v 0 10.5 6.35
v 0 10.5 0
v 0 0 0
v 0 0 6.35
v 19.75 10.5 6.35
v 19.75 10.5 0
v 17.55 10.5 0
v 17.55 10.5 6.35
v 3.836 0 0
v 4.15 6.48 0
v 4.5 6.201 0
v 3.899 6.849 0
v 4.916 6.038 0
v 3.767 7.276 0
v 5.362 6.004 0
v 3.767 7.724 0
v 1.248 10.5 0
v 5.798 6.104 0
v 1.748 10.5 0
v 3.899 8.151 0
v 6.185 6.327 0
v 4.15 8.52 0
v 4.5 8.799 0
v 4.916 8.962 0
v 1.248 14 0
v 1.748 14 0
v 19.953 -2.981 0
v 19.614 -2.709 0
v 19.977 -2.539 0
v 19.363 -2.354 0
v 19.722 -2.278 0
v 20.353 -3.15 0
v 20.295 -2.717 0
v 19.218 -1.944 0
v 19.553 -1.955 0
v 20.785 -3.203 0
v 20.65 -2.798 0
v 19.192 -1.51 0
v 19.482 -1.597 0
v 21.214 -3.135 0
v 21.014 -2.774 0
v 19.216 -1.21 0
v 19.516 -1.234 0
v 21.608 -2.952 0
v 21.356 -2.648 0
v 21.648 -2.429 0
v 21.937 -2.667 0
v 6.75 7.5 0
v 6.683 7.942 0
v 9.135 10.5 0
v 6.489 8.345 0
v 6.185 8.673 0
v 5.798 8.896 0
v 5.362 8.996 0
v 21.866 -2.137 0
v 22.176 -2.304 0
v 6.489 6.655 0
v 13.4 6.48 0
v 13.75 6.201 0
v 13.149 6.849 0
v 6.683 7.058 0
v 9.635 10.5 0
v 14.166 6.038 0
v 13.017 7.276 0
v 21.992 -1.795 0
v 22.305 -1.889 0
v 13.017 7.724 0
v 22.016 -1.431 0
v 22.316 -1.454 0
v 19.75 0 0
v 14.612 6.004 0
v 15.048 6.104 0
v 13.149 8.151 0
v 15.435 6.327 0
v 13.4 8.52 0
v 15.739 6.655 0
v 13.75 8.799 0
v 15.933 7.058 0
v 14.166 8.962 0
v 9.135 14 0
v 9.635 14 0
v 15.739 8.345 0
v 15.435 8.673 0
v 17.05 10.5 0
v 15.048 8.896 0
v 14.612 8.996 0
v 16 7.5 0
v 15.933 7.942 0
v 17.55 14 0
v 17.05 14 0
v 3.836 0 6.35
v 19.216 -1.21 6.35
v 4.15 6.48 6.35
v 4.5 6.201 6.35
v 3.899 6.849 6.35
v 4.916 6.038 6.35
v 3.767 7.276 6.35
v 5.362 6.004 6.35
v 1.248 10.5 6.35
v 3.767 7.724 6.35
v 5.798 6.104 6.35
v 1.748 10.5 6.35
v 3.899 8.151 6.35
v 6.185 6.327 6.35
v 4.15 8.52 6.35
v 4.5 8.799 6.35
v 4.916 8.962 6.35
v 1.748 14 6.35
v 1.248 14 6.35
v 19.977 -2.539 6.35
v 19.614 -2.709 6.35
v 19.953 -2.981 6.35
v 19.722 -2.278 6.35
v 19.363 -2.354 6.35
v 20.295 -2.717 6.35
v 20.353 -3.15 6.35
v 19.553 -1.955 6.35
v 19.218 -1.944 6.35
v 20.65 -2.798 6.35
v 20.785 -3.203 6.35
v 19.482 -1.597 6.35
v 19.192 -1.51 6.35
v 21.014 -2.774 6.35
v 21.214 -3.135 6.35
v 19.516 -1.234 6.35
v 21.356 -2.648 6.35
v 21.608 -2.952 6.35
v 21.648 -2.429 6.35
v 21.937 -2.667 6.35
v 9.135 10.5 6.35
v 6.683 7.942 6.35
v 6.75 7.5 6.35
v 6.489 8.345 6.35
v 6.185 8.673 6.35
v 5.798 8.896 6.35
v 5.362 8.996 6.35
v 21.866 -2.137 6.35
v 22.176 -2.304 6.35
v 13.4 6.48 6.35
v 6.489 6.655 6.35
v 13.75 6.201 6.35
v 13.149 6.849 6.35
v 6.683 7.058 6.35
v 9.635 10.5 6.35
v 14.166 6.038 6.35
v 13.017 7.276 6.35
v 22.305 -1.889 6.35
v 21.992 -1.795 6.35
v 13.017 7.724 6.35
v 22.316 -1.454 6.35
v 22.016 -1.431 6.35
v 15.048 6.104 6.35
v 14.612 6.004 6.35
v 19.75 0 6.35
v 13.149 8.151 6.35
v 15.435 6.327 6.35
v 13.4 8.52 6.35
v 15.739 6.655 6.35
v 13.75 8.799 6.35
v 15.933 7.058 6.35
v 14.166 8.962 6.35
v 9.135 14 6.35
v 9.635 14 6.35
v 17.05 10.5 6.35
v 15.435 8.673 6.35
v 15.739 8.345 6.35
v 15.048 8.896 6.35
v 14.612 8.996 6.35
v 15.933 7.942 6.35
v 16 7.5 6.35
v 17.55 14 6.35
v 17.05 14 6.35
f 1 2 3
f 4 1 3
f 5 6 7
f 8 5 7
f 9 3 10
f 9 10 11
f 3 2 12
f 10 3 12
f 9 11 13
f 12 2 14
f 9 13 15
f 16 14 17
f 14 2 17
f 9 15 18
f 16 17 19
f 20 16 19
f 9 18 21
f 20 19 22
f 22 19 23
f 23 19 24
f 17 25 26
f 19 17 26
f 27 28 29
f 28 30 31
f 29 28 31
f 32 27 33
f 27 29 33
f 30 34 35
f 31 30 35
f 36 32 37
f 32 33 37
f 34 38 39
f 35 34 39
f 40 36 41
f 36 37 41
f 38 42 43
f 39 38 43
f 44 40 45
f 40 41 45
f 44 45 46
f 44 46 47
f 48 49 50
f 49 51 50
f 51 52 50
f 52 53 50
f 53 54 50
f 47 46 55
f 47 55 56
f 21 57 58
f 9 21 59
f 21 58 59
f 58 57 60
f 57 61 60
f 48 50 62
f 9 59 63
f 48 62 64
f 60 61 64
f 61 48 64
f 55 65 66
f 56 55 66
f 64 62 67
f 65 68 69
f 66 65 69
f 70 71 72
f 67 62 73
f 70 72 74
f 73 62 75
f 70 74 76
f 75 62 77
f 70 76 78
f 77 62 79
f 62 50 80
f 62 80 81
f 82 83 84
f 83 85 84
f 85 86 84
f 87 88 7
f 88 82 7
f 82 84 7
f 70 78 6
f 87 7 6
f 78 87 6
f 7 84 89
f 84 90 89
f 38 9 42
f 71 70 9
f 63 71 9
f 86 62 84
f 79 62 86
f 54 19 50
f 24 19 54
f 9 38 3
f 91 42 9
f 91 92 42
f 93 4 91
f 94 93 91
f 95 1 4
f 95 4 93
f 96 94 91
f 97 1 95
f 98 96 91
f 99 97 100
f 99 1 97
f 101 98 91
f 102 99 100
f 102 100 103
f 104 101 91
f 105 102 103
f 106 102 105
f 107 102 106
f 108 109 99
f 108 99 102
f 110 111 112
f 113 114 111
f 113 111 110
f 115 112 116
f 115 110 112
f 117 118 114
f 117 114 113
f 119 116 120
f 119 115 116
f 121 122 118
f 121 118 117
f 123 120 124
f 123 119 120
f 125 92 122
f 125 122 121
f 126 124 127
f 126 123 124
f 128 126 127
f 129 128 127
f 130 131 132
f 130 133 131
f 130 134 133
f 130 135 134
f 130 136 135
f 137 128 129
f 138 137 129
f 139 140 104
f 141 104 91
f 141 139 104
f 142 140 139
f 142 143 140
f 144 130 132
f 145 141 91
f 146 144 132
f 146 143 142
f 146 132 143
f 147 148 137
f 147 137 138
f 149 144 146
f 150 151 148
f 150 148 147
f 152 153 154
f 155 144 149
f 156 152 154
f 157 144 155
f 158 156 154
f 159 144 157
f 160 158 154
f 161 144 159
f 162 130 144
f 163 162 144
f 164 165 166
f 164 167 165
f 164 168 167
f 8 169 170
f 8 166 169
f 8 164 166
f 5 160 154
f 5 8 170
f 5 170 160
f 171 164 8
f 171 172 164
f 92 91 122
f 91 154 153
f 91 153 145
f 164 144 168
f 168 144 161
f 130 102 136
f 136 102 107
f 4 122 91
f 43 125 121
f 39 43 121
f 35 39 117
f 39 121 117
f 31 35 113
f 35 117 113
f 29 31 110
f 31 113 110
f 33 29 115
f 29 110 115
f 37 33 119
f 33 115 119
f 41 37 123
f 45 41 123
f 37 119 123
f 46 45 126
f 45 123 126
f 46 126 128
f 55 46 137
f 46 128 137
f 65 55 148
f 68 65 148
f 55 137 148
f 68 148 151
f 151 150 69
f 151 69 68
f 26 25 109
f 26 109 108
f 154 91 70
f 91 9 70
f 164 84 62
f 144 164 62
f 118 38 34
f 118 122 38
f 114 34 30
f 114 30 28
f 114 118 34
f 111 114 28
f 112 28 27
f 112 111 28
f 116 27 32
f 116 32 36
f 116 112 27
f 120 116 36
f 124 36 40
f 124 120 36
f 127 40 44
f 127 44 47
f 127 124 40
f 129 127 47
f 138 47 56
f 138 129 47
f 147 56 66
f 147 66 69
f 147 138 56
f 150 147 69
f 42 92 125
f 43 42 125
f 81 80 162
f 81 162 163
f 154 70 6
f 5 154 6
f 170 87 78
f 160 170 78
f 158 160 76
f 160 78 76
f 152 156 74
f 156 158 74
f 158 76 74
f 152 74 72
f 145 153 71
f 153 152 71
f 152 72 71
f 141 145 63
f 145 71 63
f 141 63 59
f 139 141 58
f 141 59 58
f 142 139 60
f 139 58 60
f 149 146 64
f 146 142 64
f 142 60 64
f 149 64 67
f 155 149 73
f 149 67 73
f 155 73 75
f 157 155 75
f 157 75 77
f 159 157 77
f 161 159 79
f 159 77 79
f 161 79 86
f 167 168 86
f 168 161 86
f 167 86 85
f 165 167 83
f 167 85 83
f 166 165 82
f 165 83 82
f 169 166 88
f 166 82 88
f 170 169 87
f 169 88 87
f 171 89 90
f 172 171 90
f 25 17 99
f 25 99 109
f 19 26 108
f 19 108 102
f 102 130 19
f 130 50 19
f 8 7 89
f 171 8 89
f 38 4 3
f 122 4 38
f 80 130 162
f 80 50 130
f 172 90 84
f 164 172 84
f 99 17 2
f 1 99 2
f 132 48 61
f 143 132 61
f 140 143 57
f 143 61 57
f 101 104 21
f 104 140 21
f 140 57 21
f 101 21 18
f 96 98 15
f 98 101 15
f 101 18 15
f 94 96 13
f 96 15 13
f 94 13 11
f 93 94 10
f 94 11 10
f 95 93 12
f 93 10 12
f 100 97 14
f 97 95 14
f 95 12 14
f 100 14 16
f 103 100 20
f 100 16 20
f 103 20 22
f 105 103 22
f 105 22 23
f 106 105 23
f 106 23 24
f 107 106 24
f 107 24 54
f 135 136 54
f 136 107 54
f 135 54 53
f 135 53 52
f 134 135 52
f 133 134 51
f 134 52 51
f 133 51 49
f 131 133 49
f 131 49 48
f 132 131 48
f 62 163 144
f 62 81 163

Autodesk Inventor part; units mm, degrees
ref_plane "YZ Plane" through (0, 0, 0) normal (1, 0, 0) x (0, 1, 0)
ref_plane "XZ Plane" through (0, 0, 0) normal (0, 1, 0) x (-1, 0, 0)
ref_plane "XY Plane" through (0, 0, 0) normal (0, 0, 1) x (1, 0, 0)
sketch "Sketch1" plane through (0, 0, 0) normal (0, 0, 1) x (1, 0, 0)
  line L0 (0, 0) -> (19.75, 0)
  line L1 (19.75, 0) -> (19.75, 10.5)
  line L2 (0, 10.5) -> (0, 0)
  line L3 (1.2485, 10.5) -> (1.2485, 14)
  line L4 (1.2485, 14) -> (1.7485, 14)
  line L5 (1.7485, 14) -> (1.7485, 10.5)
  line L6 (9.135, 10.5) -> (9.135, 14)
  line L7 (9.135, 14) -> (9.635, 14)
  line L8 (9.635, 14) -> (9.635, 10.5)
  line L9 (17.5504, 10.5) -> (17.5504, 14)
  line L10 (17.5504, 14) -> (17.0504, 14)
  line L11 (17.0504, 14) -> (17.0504, 10.5)
  line L12 (19.75, 10.5) -> (17.5504, 10.5)
  line L13 (17.0504, 10.5) -> (9.635, 10.5)
  line L14 (9.135, 10.5) -> (1.7485, 10.5)
  line L15 (1.2485, 10.5) -> (0, 10.5)
  line L16 (5.25, 7.5) -> (14.5, 7.5) construction
  circle A0 centre (5.25, 7.5) radius 1.5
  circle A1 centre (14.5, 7.5) radius 1.5
  dimension "d0" = 19.75
  dimension "d1" = 10.5
  dimension "d2" = 14
  dimension "d3" = 0.5
  dimension "d6" = 3
  dimension "d7" = 3
  dimension "d8" = 5.25
  dimension "d9" = 5.25
  dimension "d17" = 9.25
extrude "Extrusion1" add sketch "Sketch1" along normal blind 6.35
sketch "Sketch2" plane through (0, 0, 6.35) normal (0, 0, 1) x (1, 0, 0)
  line L0 (0, 0) -> (19.1921, -1.5105)
  line L1 (19.1921, -1.5105) -> (19.2157, -1.2105) construction
  line L2 (19.2157, -1.2105) -> (3.8355, 0)
  line L3 (0, 0) -> (19.75, 0) projected
  line L4 (0, 0) -> (3.8355, 0)
  arc A0 (19.1921, -1.5105) -> (22.3157, -1.4544) centre (20.7566, -1.6336) ccw
  line L5 (19.2157, -1.2105) -> (19.5157, -1.2341)
  line L6 (22.3157, -1.4544) -> (22.0157, -1.4308)
  arc A1 (19.5157, -1.2341) -> (22.0157, -1.4308) centre (20.75, -1.532) ccw
  line L7 (17.1531, -3.25) -> (26.6817, -3.25) construction
  line L8 (17.0504, 10.5) -> (9.635, 10.5) projected
  line L9 (19.75, 0) -> (19.75, 10.5) projected
  dimension "d10" = 0.3
  dimension "d11" = 13.75
  dimension "d12" = 4.5
  dimension "d13" = 2.5
  dimension "d14" = 1
extrude "Extrusion2" add sketch "Sketch2" against normal up to surface (6.35 mm away)
properties part number "Micro Endstop Triggered"
